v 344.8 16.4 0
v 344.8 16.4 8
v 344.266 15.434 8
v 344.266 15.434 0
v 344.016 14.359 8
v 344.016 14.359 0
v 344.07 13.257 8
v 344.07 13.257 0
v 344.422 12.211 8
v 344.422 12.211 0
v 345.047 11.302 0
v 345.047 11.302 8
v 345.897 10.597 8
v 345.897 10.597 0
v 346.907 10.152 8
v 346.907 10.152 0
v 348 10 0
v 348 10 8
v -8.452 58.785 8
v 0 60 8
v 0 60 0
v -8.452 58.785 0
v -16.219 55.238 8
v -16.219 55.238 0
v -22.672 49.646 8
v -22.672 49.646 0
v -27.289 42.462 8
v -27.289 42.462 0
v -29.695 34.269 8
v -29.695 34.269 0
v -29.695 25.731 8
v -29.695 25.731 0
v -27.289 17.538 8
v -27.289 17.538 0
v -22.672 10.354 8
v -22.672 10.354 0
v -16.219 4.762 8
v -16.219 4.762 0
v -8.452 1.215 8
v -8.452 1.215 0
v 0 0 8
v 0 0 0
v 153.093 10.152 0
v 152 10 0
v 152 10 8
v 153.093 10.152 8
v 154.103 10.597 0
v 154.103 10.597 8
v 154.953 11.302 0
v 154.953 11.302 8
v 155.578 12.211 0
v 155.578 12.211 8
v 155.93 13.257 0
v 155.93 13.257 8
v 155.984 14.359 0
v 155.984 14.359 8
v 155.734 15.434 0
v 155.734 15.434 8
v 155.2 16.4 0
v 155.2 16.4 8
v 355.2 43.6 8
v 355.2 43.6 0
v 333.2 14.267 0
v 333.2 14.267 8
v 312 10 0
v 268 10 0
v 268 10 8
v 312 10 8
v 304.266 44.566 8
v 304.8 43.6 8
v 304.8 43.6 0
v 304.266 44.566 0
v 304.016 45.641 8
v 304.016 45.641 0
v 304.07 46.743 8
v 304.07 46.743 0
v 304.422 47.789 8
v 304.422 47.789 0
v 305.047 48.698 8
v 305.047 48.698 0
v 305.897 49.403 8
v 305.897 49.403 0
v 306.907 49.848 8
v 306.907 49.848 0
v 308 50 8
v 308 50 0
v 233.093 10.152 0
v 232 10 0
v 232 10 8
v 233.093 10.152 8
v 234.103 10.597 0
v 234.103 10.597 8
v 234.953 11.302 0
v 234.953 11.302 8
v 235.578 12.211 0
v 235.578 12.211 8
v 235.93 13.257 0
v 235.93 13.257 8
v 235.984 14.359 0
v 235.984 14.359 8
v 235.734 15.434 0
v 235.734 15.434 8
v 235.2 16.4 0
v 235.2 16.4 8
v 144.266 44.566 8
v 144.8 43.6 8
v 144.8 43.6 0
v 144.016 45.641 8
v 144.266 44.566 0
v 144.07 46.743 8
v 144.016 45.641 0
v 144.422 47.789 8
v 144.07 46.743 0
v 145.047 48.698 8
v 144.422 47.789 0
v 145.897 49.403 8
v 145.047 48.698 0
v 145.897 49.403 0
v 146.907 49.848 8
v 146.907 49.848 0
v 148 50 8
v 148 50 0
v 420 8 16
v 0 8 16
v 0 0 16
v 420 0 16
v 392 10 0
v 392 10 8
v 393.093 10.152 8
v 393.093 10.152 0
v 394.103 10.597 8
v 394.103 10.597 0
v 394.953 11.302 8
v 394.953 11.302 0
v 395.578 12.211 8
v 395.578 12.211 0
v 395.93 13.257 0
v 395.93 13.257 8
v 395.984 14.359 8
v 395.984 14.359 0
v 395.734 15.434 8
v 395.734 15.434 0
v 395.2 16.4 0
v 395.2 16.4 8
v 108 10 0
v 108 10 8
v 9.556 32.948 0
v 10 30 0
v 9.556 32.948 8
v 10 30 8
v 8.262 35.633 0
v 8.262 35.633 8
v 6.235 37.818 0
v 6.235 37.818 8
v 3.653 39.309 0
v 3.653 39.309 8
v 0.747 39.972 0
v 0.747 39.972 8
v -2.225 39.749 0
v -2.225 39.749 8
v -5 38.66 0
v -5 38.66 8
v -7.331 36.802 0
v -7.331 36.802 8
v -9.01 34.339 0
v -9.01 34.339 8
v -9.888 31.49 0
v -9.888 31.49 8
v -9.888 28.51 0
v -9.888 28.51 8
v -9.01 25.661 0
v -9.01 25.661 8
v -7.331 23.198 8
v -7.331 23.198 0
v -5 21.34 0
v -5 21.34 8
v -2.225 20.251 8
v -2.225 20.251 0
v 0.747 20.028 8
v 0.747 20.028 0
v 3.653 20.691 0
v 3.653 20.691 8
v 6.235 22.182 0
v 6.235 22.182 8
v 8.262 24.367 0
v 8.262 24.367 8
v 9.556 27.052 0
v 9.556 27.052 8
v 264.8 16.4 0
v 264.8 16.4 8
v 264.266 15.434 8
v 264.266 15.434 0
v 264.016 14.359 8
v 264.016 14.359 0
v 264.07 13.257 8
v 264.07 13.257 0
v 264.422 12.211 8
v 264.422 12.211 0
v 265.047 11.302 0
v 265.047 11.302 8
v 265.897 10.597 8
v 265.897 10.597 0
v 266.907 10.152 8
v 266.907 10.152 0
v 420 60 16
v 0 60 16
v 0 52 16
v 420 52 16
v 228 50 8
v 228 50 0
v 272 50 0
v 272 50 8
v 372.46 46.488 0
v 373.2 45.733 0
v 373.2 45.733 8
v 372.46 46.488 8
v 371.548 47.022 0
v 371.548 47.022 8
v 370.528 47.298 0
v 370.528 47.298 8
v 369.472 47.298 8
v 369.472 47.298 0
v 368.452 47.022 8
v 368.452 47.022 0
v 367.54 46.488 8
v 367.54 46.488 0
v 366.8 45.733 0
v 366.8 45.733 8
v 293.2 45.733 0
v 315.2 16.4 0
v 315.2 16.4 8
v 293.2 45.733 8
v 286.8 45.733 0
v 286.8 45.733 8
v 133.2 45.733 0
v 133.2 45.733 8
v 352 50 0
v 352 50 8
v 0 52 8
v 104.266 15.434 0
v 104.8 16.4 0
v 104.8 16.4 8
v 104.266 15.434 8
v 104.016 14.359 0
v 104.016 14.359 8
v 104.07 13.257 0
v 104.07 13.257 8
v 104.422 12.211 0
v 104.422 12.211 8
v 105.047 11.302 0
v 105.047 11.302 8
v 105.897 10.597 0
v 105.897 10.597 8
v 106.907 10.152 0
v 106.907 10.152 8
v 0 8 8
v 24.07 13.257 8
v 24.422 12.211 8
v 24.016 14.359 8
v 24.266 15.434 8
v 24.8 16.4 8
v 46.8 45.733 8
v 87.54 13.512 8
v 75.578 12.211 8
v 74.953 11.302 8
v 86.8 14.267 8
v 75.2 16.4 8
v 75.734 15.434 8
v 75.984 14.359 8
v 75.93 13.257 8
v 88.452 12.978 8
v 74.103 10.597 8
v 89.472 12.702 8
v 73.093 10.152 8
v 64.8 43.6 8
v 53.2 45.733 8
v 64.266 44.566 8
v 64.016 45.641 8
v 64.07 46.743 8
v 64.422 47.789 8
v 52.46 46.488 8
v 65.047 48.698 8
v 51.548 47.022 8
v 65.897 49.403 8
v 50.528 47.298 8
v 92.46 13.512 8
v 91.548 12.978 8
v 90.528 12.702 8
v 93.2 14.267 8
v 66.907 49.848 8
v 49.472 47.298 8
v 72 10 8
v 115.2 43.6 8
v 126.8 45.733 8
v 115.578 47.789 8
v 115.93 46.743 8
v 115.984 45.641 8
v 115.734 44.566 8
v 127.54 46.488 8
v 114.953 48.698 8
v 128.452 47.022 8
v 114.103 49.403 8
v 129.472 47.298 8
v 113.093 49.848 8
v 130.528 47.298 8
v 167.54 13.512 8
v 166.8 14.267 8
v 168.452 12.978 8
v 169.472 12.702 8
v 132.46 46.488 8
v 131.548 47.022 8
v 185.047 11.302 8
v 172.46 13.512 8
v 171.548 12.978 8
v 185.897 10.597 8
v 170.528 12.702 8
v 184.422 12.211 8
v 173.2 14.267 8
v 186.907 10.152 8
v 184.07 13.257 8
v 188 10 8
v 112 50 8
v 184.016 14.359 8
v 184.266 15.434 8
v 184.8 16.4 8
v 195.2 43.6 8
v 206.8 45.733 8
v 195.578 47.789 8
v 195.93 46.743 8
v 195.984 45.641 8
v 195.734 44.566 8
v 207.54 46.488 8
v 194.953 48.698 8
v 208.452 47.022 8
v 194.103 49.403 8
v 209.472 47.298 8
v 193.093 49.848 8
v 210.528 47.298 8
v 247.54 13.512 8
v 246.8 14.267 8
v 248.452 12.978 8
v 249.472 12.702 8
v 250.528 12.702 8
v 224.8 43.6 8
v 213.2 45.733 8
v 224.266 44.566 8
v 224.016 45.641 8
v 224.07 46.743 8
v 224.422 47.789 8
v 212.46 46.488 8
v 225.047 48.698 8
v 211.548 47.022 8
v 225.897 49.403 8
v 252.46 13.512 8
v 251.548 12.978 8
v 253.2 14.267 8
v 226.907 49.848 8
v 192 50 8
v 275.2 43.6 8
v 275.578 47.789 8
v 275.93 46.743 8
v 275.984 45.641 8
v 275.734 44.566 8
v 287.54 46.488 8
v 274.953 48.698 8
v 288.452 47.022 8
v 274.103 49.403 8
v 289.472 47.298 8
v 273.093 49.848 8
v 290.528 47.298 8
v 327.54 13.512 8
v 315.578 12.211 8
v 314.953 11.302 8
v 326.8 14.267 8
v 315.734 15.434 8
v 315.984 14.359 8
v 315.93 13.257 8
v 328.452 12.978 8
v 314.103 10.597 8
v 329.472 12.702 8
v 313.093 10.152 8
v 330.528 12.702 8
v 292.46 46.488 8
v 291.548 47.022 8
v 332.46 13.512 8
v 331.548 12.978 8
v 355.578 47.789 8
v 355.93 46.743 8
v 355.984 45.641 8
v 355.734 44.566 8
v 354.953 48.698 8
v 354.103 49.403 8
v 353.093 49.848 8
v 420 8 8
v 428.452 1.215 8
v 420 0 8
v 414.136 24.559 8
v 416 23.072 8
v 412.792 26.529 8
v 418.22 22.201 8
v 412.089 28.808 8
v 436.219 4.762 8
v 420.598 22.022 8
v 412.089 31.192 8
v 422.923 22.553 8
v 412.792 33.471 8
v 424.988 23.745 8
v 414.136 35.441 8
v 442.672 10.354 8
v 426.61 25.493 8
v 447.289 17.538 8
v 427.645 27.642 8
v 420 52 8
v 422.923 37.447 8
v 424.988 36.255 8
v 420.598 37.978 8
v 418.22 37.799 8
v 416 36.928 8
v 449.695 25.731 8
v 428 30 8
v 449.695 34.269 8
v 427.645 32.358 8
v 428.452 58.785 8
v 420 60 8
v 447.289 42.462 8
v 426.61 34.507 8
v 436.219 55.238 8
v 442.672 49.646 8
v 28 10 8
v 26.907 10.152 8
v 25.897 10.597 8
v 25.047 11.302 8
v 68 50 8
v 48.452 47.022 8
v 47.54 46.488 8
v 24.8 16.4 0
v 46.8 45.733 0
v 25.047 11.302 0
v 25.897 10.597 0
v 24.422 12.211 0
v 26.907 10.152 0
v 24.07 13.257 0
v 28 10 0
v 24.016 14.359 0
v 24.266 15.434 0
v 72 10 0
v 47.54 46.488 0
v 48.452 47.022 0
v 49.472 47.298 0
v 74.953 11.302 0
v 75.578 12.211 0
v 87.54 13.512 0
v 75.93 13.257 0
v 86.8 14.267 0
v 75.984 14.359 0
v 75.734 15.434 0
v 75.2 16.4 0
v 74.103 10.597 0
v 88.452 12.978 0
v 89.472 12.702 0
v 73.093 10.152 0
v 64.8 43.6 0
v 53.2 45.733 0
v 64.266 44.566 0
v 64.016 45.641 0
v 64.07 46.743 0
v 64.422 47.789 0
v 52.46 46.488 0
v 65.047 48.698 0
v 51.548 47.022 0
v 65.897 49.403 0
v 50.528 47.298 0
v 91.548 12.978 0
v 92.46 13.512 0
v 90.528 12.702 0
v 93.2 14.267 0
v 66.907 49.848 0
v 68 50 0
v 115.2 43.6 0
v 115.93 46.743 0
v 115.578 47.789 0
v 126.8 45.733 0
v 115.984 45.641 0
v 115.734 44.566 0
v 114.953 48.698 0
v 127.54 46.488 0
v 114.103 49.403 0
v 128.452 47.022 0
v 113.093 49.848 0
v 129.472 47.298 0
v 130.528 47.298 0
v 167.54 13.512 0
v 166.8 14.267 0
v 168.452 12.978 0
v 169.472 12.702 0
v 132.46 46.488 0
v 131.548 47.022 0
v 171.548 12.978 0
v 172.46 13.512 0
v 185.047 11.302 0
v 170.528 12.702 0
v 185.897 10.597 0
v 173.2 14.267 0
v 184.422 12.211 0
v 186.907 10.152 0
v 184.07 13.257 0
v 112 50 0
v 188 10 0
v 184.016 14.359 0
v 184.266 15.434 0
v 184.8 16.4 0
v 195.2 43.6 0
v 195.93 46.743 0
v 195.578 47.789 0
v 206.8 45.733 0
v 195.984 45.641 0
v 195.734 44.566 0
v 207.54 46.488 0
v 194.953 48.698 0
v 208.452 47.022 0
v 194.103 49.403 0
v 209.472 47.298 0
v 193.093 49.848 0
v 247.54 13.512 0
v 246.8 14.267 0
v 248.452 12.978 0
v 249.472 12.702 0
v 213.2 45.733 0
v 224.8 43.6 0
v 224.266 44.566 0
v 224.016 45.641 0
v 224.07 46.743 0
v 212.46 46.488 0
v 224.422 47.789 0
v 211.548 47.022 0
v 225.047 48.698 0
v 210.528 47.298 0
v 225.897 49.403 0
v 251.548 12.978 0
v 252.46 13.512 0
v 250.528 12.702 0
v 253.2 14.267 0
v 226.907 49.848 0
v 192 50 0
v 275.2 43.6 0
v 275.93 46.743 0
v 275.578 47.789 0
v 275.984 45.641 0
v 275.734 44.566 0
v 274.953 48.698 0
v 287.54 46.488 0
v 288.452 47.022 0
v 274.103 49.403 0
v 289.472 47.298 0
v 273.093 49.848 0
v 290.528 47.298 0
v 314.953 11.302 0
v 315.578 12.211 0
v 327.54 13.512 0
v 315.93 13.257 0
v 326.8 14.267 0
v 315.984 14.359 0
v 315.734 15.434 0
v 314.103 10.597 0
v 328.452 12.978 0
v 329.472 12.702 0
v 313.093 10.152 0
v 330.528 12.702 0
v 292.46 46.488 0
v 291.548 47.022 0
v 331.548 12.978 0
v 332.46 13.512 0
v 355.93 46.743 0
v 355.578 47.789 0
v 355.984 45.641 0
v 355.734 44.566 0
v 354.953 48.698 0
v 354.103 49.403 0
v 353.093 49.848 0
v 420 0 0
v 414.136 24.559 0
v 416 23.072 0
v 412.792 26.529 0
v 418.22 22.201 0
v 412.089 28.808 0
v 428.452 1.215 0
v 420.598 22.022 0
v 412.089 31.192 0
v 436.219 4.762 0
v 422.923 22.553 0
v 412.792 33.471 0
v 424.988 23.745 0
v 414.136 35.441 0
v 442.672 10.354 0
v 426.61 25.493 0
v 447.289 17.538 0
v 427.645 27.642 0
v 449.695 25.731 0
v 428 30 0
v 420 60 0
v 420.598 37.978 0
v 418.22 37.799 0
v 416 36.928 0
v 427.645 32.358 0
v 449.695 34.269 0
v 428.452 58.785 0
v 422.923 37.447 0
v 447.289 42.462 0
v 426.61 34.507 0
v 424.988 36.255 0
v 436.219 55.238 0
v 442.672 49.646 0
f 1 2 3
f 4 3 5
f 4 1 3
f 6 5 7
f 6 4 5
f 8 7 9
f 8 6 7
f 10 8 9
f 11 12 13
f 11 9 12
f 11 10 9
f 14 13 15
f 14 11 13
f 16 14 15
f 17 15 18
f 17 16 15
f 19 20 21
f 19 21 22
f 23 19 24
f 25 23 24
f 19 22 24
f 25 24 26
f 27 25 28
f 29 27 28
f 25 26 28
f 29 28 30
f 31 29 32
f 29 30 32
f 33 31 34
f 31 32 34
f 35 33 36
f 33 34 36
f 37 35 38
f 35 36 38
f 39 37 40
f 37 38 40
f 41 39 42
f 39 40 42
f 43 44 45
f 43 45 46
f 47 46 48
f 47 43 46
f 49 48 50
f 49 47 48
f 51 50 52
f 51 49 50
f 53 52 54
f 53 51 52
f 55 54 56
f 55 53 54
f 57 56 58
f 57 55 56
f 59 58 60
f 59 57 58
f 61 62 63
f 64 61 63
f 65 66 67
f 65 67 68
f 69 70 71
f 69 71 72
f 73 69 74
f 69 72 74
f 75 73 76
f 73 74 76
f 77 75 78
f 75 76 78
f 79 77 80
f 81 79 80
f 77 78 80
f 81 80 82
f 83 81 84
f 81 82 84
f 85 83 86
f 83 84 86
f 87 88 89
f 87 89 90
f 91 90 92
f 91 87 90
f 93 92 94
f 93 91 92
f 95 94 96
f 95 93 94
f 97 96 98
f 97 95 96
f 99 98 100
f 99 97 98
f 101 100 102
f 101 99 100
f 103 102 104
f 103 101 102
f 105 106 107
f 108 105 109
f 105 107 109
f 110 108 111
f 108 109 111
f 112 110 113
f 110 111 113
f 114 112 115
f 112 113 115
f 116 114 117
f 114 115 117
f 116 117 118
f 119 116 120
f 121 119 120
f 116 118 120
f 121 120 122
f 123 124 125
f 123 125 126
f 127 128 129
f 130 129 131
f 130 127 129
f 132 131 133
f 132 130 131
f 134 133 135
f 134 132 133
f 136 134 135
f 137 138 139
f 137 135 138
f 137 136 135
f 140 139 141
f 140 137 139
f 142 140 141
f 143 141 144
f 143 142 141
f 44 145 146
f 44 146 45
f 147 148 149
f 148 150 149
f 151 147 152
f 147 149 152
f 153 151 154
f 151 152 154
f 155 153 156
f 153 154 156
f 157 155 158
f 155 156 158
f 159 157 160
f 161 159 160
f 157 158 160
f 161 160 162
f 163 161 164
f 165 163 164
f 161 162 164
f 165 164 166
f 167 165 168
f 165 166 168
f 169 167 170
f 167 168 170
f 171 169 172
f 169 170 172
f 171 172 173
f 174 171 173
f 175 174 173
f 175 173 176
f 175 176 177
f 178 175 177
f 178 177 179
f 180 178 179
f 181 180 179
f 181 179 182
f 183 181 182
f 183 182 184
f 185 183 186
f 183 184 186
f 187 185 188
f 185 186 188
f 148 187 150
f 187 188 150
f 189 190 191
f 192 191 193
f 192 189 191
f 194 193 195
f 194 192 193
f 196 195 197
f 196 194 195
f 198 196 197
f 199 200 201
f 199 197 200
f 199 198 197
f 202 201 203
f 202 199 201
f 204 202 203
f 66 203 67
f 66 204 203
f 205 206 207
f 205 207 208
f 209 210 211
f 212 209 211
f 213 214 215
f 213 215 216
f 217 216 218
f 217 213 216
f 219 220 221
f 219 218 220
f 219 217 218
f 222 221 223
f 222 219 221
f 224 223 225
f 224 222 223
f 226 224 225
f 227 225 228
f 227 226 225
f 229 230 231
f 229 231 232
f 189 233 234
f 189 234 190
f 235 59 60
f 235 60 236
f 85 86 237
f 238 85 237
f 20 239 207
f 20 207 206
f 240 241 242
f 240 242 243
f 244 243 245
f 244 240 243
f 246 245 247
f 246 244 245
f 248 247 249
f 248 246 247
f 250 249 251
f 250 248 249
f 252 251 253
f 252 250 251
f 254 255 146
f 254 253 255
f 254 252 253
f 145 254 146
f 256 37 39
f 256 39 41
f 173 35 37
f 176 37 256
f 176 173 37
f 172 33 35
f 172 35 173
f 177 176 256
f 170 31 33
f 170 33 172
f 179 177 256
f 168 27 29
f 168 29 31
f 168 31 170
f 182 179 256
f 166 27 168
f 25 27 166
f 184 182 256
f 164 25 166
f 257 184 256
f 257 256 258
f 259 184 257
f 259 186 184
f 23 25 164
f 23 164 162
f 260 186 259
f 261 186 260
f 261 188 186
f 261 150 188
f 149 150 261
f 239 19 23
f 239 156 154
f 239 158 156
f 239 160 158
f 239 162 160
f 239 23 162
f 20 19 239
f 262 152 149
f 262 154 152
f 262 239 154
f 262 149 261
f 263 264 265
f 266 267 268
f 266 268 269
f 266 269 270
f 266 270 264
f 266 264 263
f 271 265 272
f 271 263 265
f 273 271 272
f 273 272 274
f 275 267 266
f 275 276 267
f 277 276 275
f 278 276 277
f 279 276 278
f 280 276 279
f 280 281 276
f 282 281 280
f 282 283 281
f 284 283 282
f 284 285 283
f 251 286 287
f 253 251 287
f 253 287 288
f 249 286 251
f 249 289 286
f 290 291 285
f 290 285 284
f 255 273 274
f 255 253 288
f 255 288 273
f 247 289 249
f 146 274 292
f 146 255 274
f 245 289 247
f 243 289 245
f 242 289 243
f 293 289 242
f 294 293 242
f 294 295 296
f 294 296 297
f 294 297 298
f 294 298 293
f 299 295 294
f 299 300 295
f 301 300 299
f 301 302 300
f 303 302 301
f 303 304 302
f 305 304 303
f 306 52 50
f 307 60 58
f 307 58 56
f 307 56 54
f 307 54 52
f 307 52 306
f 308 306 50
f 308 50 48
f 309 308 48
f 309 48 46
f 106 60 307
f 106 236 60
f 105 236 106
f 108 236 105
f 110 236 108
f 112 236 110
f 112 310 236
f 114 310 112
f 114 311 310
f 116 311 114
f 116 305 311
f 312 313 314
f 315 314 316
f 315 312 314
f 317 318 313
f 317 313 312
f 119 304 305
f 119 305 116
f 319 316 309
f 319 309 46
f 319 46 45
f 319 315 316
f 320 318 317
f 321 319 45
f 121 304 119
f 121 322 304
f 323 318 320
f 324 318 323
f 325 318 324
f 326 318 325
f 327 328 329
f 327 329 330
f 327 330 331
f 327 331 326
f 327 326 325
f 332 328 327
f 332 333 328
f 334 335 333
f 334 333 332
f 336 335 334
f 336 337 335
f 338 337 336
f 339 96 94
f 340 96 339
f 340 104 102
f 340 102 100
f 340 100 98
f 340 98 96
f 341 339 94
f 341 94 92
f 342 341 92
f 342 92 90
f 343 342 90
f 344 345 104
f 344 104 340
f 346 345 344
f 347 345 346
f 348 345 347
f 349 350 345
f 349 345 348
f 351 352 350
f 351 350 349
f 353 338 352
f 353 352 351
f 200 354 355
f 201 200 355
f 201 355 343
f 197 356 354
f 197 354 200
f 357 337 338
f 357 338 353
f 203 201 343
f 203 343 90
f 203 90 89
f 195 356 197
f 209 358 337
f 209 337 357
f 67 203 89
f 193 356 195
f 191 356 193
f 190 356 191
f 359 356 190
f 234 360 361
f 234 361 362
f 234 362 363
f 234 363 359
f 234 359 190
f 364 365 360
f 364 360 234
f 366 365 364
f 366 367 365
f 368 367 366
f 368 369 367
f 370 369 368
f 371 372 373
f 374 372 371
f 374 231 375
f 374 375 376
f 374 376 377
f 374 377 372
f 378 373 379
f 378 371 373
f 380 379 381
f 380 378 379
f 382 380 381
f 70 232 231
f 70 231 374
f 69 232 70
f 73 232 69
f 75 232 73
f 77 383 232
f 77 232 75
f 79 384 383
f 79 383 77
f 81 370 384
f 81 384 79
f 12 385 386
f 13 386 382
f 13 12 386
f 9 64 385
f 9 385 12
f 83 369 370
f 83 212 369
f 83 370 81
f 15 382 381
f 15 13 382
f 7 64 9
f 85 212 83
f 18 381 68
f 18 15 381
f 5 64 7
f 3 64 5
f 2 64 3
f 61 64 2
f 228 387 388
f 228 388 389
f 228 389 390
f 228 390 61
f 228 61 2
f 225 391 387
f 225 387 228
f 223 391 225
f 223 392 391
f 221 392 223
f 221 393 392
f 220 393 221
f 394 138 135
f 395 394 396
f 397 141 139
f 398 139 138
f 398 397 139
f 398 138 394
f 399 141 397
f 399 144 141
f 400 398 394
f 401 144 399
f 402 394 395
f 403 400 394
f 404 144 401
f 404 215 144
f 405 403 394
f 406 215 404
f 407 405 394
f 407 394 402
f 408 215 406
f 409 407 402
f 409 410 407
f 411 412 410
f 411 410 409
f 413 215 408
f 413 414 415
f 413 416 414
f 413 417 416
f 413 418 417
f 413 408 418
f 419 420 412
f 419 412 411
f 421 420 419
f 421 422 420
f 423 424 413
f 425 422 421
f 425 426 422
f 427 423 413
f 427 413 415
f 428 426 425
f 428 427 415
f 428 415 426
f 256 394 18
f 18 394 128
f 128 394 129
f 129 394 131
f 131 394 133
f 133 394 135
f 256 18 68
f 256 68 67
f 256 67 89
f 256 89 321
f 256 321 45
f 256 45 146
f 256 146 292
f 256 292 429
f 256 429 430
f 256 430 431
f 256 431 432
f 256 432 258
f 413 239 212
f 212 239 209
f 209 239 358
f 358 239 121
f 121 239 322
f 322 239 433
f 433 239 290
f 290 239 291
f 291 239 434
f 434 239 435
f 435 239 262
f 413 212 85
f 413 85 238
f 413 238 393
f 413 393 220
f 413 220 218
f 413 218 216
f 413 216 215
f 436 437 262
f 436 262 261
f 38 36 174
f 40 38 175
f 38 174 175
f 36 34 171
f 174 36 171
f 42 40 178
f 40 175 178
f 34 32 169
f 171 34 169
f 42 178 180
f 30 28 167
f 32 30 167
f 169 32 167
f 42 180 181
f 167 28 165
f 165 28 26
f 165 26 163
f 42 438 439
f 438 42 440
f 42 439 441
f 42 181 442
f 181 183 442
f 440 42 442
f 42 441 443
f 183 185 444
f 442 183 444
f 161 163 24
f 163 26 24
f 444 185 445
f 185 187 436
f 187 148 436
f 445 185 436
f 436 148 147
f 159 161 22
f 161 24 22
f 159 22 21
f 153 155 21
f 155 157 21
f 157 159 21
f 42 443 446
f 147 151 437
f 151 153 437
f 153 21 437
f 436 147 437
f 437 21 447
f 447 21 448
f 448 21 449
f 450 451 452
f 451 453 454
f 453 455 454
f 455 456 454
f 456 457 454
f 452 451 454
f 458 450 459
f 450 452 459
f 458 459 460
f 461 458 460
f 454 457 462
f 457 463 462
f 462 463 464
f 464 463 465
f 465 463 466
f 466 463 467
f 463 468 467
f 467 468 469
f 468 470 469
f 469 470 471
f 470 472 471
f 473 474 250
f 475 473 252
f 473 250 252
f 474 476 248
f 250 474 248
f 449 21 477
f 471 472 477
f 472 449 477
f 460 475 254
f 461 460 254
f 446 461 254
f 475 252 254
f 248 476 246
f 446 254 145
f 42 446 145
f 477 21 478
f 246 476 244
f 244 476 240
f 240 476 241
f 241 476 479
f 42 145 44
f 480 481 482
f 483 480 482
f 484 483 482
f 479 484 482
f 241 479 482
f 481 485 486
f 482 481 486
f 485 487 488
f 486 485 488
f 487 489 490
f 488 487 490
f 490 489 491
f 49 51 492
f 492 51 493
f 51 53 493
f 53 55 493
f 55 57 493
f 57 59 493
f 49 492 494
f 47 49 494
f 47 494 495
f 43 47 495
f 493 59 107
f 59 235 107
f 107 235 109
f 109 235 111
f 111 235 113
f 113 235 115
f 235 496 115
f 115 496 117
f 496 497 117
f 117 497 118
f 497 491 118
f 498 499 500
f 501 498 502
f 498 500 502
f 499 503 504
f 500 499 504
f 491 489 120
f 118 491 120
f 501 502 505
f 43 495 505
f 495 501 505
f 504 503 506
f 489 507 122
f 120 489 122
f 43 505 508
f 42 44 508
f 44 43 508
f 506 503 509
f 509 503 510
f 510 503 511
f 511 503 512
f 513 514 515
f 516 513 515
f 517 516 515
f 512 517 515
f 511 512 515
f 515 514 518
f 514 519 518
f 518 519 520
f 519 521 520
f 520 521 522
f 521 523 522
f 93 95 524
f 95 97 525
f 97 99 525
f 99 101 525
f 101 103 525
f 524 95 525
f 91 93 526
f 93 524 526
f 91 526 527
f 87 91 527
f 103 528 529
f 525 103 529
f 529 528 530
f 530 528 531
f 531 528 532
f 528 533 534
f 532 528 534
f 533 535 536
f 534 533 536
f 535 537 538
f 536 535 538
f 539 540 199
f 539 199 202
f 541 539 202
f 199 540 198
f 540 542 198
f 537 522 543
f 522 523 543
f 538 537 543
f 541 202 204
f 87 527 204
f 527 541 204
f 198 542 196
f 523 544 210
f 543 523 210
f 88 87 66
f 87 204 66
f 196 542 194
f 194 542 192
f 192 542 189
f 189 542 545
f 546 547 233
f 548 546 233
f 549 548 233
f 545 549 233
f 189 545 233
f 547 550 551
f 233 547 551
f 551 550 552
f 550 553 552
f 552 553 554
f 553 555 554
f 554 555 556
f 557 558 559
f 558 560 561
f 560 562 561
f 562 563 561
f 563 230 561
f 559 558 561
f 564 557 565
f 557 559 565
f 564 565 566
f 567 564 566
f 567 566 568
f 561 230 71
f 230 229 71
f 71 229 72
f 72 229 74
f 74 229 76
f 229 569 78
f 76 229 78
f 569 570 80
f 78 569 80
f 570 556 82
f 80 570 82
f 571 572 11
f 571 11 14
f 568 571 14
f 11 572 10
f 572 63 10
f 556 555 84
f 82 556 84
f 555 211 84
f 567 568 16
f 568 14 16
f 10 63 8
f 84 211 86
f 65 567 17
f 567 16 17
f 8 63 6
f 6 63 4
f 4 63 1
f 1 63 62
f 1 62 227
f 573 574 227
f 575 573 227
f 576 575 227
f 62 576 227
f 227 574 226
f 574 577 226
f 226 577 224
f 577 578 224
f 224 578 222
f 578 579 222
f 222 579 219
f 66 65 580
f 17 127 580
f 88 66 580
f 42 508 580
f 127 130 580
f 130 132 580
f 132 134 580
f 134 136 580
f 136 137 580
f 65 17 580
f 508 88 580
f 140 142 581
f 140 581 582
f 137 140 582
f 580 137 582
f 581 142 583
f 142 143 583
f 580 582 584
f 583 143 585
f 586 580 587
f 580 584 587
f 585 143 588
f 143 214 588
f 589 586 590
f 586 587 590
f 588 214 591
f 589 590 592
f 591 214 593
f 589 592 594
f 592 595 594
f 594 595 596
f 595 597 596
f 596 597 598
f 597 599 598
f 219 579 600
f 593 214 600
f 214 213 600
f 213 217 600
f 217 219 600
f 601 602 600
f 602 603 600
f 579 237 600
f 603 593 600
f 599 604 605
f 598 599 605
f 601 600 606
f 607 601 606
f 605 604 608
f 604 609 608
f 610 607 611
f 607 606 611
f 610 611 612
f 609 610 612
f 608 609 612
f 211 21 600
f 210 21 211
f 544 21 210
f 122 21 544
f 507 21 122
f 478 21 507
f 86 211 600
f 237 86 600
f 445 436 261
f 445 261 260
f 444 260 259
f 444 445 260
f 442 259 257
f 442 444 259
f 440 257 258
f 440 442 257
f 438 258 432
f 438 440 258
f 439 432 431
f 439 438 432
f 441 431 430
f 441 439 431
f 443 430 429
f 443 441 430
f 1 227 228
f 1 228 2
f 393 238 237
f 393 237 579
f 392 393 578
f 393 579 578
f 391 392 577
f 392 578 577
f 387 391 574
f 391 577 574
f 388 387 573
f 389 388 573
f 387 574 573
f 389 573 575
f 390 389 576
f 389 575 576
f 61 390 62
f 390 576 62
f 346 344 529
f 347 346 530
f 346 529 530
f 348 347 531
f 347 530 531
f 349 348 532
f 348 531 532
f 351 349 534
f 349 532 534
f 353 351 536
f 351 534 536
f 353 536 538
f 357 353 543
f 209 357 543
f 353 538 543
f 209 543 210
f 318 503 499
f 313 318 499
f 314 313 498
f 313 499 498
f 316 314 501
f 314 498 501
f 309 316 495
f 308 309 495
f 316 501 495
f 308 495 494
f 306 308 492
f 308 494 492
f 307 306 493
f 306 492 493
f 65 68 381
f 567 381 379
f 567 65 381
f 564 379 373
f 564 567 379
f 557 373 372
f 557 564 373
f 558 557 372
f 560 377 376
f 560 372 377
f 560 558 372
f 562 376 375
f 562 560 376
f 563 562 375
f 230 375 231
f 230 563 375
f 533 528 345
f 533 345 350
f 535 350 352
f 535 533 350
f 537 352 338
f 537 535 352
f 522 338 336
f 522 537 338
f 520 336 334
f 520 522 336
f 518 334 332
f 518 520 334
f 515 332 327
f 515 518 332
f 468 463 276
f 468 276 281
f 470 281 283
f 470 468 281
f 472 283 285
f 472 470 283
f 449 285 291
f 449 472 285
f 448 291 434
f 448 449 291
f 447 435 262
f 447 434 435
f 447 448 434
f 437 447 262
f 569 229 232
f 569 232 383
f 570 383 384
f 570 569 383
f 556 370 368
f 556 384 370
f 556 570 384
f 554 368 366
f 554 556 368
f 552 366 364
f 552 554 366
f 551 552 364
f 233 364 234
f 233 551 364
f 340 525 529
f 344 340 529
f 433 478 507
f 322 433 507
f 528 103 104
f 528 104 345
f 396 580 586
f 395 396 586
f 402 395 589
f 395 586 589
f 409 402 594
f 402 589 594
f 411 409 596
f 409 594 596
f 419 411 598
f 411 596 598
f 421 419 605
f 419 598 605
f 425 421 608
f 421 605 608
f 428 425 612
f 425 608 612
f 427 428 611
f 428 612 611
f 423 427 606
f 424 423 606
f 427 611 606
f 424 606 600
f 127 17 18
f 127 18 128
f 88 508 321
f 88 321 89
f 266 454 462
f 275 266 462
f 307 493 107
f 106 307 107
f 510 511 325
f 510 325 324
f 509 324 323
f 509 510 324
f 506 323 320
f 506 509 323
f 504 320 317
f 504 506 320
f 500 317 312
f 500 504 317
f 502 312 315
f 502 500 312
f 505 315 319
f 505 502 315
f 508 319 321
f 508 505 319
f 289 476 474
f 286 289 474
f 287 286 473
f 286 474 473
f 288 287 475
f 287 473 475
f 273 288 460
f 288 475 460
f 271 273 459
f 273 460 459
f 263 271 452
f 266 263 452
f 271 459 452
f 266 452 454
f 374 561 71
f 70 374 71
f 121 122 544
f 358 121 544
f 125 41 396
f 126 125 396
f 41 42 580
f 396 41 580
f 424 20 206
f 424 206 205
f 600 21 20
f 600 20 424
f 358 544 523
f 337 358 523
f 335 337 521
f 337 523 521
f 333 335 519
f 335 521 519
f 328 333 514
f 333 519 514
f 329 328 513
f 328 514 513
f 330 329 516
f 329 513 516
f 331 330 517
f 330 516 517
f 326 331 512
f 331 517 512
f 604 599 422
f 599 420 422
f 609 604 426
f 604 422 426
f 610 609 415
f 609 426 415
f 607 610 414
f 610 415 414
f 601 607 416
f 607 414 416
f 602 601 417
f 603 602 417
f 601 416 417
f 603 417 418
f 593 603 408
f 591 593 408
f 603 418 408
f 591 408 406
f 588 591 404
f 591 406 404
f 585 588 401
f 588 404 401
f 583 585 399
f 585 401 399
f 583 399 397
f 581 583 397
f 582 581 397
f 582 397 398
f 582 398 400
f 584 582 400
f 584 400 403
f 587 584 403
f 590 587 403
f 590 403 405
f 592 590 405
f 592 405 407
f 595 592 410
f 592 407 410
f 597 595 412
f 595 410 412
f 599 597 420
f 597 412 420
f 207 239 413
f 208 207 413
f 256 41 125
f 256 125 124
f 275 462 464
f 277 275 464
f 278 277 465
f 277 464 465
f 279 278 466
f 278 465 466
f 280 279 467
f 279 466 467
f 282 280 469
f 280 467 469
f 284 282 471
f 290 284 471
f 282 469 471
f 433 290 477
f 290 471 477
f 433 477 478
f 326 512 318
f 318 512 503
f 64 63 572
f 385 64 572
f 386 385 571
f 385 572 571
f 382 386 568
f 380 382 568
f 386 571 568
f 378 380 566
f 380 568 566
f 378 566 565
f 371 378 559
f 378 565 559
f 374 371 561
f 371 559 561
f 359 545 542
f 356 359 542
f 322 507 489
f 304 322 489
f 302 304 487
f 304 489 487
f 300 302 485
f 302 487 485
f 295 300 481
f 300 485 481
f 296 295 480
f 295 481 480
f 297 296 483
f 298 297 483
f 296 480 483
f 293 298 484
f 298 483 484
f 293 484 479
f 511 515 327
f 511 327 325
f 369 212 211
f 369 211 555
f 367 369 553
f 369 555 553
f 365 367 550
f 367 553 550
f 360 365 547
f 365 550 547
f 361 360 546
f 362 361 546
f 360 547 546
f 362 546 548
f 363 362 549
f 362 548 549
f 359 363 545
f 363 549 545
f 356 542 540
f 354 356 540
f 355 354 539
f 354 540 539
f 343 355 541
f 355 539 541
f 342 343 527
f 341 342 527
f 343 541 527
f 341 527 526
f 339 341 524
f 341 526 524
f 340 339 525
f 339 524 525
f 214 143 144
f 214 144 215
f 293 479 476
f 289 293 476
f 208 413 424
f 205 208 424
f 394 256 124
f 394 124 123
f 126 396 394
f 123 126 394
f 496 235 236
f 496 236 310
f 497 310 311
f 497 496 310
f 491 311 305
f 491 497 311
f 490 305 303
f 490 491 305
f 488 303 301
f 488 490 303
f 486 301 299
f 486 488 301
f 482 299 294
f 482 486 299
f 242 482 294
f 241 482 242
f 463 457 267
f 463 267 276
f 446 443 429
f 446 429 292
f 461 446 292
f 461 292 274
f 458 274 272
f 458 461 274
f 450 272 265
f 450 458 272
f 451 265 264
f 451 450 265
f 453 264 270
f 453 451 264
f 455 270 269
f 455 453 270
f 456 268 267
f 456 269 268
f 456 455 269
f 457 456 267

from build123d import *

# Parameters (mm, degrees)
SKETCH_1_W          = 420
SKETCH_1_H          = 60
EXTRUDE_1_DEPTH     = 8
SKETCH_2_R          = 30
EXTRUDE_2_DEPTH     = 8
SKETCH_3_W          = 420
SKETCH_3_H          = 8
EXTRUDE_3_DEPTH     = 8
SKETCH_4_R          = 10
CUT_EXTRUDE_1_DEPTH = 481
SKETCH_5_R          = 8
CUT_EXTRUDE_2_DEPTH = 481
CUT_EXTRUDE_3_DEPTH = 455.264240283


with BuildPart() as part:
    # 草图1 → 凸台-拉伸1 (new body)
    with BuildSketch(Plane.XY):
        with Locations((210, 30)):
            Rectangle(SKETCH_1_W, SKETCH_1_H)
    extrude(amount=EXTRUDE_1_DEPTH)

    # 草图2 → 凸台-拉伸2 (add)
    with BuildSketch(Plane.XY):
        with Locations((0, 30)):
            Circle(SKETCH_2_R)
        with Locations((420, 30)):
            Circle(SKETCH_2_R)
    extrude(amount=EXTRUDE_2_DEPTH)

    # 草图3 → 凸台-拉伸3 (add)
    with BuildSketch(Plane.XY.offset(8)):
        with Locations((210, 4)):
            Rectangle(SKETCH_3_W, SKETCH_3_H)
        with Locations((210, 56)):
            Rectangle(SKETCH_3_W, SKETCH_3_H)
    extrude(amount=EXTRUDE_3_DEPTH)

    # 草图4 → 切除-拉伸1 (cut, symmetric)
    with BuildSketch(Plane.XY.offset(8)):
        with Locations((0, 30)):
            Circle(SKETCH_4_R)
    extrude(amount=CUT_EXTRUDE_1_DEPTH, both=True, mode=Mode.SUBTRACT)

    # 草图5 → 切除-拉伸2 (cut, symmetric)
    with BuildSketch(Plane.XY.offset(8)):
        with Locations((420, 30)):
            Circle(SKETCH_5_R)
    extrude(amount=CUT_EXTRUDE_2_DEPTH, both=True, mode=Mode.SUBTRACT)

    # 草图6 → 切除-拉伸3 (cut, through all)
    with BuildSketch(Plane.XY):
        with BuildLine():
            Line((28, 10), (72, 10))
            ThreePointArc((72, 10), (75.577708764, 12.211145618), (75.2, 16.4))
            Line((75.2, 16.4), (53.2, 45.733333333))
            ThreePointArc((53.2, 45.733333333), (50, 47.333333333), (46.8, 45.733333333))
            Line((46.8, 45.733333333), (24.8, 16.4))
            ThreePointArc((24.8, 16.4), (24.422291236, 12.211145618), (28, 10))
        make_face()
        with BuildLine():
            Line((108, 10), (152, 10))
            ThreePointArc((152, 10), (155.577708764, 12.211145618), (155.2, 16.4))
            Line((155.2, 16.4), (133.2, 45.733333333))
            ThreePointArc((133.2, 45.733333333), (130, 47.333333333), (126.8, 45.733333333))
            Line((126.8, 45.733333333), (104.8, 16.4))
            ThreePointArc((104.8, 16.4), (104.422291236, 12.211145618), (108, 10))
        make_face()
        with BuildLine():
            Line((188, 10), (232, 10))
            ThreePointArc((232, 10), (235.577708764, 12.211145618), (235.2, 16.4))
            Line((235.2, 16.4), (213.2, 45.733333333))
            ThreePointArc((213.2, 45.733333333), (210, 47.333333333), (206.8, 45.733333333))
            Line((206.8, 45.733333333), (184.8, 16.4))
            ThreePointArc((184.8, 16.4), (184.422291236, 12.211145618), (188, 10))
        make_face()
        with BuildLine():
            Line((268, 10), (312, 10))
            ThreePointArc((312, 10), (315.577708764, 12.211145618), (315.2, 16.4))
            Line((315.2, 16.4), (293.2, 45.733333333))
            ThreePointArc((293.2, 45.733333333), (290, 47.333333333), (286.8, 45.733333333))
            Line((286.8, 45.733333333), (264.8, 16.4))
            ThreePointArc((264.8, 16.4), (264.422291236, 12.211145618), (268, 10))
        make_face()
        with BuildLine():
            Line((348, 10), (392, 10))
            ThreePointArc((392, 10), (395.577708764, 12.211145618), (395.2, 16.4))
            Line((395.2, 16.4), (373.2, 45.733333333))
            ThreePointArc((373.2, 45.733333333), (370, 47.333333333), (366.8, 45.733333333))
            Line((366.8, 45.733333333), (344.8, 16.4))
            ThreePointArc((344.8, 16.4), (344.422291236, 12.211145618), (348, 10))
        make_face()
        with BuildLine():
            Line((68, 50), (112, 50))
            ThreePointArc((112, 50), (115.577708764, 47.788854382), (115.2, 43.6))
            Line((115.2, 43.6), (93.2, 14.266666667))
            ThreePointArc((93.2, 14.266666667), (90, 12.666666667), (86.8, 14.266666667))
            Line((86.8, 14.266666667), (64.8, 43.6))
            ThreePointArc((64.8, 43.6), (64.422291236, 47.788854382), (68, 50))
        make_face()
        with BuildLine():
            Line((148, 50), (192, 50))
            ThreePointArc((192, 50), (195.577708764, 47.788854382), (195.2, 43.6))
            Line((195.2, 43.6), (173.2, 14.266666667))
            ThreePointArc((173.2, 14.266666667), (170, 12.666666667), (166.8, 14.266666667))
            Line((166.8, 14.266666667), (144.8, 43.6))
            ThreePointArc((144.8, 43.6), (144.422291236, 47.788854382), (148, 50))
        make_face()
        with BuildLine():
            Line((228, 50), (272, 50))
            ThreePointArc((272, 50), (275.577708764, 47.788854382), (275.2, 43.6))
            Line((275.2, 43.6), (253.2, 14.266666667))
            ThreePointArc((253.2, 14.266666667), (250, 12.666666667), (246.8, 14.266666667))
            Line((246.8, 14.266666667), (224.8, 43.6))
            ThreePointArc((224.8, 43.6), (224.422291236, 47.788854382), (228, 50))
        make_face()
        with BuildLine():
            Line((308, 50), (352, 50))
            ThreePointArc((352, 50), (355.577708764, 47.788854382), (355.2, 43.6))
            Line((355.2, 43.6), (333.2, 14.266666667))
            ThreePointArc((333.2, 14.266666667), (330, 12.666666667), (326.8, 14.266666667))
            Line((326.8, 14.266666667), (304.8, 43.6))
            ThreePointArc((304.8, 43.6), (304.422291236, 47.788854382), (308, 50))
        make_face()
    extrude(amount=CUT_EXTRUDE_3_DEPTH, mode=Mode.SUBTRACT)


solid = part.part
